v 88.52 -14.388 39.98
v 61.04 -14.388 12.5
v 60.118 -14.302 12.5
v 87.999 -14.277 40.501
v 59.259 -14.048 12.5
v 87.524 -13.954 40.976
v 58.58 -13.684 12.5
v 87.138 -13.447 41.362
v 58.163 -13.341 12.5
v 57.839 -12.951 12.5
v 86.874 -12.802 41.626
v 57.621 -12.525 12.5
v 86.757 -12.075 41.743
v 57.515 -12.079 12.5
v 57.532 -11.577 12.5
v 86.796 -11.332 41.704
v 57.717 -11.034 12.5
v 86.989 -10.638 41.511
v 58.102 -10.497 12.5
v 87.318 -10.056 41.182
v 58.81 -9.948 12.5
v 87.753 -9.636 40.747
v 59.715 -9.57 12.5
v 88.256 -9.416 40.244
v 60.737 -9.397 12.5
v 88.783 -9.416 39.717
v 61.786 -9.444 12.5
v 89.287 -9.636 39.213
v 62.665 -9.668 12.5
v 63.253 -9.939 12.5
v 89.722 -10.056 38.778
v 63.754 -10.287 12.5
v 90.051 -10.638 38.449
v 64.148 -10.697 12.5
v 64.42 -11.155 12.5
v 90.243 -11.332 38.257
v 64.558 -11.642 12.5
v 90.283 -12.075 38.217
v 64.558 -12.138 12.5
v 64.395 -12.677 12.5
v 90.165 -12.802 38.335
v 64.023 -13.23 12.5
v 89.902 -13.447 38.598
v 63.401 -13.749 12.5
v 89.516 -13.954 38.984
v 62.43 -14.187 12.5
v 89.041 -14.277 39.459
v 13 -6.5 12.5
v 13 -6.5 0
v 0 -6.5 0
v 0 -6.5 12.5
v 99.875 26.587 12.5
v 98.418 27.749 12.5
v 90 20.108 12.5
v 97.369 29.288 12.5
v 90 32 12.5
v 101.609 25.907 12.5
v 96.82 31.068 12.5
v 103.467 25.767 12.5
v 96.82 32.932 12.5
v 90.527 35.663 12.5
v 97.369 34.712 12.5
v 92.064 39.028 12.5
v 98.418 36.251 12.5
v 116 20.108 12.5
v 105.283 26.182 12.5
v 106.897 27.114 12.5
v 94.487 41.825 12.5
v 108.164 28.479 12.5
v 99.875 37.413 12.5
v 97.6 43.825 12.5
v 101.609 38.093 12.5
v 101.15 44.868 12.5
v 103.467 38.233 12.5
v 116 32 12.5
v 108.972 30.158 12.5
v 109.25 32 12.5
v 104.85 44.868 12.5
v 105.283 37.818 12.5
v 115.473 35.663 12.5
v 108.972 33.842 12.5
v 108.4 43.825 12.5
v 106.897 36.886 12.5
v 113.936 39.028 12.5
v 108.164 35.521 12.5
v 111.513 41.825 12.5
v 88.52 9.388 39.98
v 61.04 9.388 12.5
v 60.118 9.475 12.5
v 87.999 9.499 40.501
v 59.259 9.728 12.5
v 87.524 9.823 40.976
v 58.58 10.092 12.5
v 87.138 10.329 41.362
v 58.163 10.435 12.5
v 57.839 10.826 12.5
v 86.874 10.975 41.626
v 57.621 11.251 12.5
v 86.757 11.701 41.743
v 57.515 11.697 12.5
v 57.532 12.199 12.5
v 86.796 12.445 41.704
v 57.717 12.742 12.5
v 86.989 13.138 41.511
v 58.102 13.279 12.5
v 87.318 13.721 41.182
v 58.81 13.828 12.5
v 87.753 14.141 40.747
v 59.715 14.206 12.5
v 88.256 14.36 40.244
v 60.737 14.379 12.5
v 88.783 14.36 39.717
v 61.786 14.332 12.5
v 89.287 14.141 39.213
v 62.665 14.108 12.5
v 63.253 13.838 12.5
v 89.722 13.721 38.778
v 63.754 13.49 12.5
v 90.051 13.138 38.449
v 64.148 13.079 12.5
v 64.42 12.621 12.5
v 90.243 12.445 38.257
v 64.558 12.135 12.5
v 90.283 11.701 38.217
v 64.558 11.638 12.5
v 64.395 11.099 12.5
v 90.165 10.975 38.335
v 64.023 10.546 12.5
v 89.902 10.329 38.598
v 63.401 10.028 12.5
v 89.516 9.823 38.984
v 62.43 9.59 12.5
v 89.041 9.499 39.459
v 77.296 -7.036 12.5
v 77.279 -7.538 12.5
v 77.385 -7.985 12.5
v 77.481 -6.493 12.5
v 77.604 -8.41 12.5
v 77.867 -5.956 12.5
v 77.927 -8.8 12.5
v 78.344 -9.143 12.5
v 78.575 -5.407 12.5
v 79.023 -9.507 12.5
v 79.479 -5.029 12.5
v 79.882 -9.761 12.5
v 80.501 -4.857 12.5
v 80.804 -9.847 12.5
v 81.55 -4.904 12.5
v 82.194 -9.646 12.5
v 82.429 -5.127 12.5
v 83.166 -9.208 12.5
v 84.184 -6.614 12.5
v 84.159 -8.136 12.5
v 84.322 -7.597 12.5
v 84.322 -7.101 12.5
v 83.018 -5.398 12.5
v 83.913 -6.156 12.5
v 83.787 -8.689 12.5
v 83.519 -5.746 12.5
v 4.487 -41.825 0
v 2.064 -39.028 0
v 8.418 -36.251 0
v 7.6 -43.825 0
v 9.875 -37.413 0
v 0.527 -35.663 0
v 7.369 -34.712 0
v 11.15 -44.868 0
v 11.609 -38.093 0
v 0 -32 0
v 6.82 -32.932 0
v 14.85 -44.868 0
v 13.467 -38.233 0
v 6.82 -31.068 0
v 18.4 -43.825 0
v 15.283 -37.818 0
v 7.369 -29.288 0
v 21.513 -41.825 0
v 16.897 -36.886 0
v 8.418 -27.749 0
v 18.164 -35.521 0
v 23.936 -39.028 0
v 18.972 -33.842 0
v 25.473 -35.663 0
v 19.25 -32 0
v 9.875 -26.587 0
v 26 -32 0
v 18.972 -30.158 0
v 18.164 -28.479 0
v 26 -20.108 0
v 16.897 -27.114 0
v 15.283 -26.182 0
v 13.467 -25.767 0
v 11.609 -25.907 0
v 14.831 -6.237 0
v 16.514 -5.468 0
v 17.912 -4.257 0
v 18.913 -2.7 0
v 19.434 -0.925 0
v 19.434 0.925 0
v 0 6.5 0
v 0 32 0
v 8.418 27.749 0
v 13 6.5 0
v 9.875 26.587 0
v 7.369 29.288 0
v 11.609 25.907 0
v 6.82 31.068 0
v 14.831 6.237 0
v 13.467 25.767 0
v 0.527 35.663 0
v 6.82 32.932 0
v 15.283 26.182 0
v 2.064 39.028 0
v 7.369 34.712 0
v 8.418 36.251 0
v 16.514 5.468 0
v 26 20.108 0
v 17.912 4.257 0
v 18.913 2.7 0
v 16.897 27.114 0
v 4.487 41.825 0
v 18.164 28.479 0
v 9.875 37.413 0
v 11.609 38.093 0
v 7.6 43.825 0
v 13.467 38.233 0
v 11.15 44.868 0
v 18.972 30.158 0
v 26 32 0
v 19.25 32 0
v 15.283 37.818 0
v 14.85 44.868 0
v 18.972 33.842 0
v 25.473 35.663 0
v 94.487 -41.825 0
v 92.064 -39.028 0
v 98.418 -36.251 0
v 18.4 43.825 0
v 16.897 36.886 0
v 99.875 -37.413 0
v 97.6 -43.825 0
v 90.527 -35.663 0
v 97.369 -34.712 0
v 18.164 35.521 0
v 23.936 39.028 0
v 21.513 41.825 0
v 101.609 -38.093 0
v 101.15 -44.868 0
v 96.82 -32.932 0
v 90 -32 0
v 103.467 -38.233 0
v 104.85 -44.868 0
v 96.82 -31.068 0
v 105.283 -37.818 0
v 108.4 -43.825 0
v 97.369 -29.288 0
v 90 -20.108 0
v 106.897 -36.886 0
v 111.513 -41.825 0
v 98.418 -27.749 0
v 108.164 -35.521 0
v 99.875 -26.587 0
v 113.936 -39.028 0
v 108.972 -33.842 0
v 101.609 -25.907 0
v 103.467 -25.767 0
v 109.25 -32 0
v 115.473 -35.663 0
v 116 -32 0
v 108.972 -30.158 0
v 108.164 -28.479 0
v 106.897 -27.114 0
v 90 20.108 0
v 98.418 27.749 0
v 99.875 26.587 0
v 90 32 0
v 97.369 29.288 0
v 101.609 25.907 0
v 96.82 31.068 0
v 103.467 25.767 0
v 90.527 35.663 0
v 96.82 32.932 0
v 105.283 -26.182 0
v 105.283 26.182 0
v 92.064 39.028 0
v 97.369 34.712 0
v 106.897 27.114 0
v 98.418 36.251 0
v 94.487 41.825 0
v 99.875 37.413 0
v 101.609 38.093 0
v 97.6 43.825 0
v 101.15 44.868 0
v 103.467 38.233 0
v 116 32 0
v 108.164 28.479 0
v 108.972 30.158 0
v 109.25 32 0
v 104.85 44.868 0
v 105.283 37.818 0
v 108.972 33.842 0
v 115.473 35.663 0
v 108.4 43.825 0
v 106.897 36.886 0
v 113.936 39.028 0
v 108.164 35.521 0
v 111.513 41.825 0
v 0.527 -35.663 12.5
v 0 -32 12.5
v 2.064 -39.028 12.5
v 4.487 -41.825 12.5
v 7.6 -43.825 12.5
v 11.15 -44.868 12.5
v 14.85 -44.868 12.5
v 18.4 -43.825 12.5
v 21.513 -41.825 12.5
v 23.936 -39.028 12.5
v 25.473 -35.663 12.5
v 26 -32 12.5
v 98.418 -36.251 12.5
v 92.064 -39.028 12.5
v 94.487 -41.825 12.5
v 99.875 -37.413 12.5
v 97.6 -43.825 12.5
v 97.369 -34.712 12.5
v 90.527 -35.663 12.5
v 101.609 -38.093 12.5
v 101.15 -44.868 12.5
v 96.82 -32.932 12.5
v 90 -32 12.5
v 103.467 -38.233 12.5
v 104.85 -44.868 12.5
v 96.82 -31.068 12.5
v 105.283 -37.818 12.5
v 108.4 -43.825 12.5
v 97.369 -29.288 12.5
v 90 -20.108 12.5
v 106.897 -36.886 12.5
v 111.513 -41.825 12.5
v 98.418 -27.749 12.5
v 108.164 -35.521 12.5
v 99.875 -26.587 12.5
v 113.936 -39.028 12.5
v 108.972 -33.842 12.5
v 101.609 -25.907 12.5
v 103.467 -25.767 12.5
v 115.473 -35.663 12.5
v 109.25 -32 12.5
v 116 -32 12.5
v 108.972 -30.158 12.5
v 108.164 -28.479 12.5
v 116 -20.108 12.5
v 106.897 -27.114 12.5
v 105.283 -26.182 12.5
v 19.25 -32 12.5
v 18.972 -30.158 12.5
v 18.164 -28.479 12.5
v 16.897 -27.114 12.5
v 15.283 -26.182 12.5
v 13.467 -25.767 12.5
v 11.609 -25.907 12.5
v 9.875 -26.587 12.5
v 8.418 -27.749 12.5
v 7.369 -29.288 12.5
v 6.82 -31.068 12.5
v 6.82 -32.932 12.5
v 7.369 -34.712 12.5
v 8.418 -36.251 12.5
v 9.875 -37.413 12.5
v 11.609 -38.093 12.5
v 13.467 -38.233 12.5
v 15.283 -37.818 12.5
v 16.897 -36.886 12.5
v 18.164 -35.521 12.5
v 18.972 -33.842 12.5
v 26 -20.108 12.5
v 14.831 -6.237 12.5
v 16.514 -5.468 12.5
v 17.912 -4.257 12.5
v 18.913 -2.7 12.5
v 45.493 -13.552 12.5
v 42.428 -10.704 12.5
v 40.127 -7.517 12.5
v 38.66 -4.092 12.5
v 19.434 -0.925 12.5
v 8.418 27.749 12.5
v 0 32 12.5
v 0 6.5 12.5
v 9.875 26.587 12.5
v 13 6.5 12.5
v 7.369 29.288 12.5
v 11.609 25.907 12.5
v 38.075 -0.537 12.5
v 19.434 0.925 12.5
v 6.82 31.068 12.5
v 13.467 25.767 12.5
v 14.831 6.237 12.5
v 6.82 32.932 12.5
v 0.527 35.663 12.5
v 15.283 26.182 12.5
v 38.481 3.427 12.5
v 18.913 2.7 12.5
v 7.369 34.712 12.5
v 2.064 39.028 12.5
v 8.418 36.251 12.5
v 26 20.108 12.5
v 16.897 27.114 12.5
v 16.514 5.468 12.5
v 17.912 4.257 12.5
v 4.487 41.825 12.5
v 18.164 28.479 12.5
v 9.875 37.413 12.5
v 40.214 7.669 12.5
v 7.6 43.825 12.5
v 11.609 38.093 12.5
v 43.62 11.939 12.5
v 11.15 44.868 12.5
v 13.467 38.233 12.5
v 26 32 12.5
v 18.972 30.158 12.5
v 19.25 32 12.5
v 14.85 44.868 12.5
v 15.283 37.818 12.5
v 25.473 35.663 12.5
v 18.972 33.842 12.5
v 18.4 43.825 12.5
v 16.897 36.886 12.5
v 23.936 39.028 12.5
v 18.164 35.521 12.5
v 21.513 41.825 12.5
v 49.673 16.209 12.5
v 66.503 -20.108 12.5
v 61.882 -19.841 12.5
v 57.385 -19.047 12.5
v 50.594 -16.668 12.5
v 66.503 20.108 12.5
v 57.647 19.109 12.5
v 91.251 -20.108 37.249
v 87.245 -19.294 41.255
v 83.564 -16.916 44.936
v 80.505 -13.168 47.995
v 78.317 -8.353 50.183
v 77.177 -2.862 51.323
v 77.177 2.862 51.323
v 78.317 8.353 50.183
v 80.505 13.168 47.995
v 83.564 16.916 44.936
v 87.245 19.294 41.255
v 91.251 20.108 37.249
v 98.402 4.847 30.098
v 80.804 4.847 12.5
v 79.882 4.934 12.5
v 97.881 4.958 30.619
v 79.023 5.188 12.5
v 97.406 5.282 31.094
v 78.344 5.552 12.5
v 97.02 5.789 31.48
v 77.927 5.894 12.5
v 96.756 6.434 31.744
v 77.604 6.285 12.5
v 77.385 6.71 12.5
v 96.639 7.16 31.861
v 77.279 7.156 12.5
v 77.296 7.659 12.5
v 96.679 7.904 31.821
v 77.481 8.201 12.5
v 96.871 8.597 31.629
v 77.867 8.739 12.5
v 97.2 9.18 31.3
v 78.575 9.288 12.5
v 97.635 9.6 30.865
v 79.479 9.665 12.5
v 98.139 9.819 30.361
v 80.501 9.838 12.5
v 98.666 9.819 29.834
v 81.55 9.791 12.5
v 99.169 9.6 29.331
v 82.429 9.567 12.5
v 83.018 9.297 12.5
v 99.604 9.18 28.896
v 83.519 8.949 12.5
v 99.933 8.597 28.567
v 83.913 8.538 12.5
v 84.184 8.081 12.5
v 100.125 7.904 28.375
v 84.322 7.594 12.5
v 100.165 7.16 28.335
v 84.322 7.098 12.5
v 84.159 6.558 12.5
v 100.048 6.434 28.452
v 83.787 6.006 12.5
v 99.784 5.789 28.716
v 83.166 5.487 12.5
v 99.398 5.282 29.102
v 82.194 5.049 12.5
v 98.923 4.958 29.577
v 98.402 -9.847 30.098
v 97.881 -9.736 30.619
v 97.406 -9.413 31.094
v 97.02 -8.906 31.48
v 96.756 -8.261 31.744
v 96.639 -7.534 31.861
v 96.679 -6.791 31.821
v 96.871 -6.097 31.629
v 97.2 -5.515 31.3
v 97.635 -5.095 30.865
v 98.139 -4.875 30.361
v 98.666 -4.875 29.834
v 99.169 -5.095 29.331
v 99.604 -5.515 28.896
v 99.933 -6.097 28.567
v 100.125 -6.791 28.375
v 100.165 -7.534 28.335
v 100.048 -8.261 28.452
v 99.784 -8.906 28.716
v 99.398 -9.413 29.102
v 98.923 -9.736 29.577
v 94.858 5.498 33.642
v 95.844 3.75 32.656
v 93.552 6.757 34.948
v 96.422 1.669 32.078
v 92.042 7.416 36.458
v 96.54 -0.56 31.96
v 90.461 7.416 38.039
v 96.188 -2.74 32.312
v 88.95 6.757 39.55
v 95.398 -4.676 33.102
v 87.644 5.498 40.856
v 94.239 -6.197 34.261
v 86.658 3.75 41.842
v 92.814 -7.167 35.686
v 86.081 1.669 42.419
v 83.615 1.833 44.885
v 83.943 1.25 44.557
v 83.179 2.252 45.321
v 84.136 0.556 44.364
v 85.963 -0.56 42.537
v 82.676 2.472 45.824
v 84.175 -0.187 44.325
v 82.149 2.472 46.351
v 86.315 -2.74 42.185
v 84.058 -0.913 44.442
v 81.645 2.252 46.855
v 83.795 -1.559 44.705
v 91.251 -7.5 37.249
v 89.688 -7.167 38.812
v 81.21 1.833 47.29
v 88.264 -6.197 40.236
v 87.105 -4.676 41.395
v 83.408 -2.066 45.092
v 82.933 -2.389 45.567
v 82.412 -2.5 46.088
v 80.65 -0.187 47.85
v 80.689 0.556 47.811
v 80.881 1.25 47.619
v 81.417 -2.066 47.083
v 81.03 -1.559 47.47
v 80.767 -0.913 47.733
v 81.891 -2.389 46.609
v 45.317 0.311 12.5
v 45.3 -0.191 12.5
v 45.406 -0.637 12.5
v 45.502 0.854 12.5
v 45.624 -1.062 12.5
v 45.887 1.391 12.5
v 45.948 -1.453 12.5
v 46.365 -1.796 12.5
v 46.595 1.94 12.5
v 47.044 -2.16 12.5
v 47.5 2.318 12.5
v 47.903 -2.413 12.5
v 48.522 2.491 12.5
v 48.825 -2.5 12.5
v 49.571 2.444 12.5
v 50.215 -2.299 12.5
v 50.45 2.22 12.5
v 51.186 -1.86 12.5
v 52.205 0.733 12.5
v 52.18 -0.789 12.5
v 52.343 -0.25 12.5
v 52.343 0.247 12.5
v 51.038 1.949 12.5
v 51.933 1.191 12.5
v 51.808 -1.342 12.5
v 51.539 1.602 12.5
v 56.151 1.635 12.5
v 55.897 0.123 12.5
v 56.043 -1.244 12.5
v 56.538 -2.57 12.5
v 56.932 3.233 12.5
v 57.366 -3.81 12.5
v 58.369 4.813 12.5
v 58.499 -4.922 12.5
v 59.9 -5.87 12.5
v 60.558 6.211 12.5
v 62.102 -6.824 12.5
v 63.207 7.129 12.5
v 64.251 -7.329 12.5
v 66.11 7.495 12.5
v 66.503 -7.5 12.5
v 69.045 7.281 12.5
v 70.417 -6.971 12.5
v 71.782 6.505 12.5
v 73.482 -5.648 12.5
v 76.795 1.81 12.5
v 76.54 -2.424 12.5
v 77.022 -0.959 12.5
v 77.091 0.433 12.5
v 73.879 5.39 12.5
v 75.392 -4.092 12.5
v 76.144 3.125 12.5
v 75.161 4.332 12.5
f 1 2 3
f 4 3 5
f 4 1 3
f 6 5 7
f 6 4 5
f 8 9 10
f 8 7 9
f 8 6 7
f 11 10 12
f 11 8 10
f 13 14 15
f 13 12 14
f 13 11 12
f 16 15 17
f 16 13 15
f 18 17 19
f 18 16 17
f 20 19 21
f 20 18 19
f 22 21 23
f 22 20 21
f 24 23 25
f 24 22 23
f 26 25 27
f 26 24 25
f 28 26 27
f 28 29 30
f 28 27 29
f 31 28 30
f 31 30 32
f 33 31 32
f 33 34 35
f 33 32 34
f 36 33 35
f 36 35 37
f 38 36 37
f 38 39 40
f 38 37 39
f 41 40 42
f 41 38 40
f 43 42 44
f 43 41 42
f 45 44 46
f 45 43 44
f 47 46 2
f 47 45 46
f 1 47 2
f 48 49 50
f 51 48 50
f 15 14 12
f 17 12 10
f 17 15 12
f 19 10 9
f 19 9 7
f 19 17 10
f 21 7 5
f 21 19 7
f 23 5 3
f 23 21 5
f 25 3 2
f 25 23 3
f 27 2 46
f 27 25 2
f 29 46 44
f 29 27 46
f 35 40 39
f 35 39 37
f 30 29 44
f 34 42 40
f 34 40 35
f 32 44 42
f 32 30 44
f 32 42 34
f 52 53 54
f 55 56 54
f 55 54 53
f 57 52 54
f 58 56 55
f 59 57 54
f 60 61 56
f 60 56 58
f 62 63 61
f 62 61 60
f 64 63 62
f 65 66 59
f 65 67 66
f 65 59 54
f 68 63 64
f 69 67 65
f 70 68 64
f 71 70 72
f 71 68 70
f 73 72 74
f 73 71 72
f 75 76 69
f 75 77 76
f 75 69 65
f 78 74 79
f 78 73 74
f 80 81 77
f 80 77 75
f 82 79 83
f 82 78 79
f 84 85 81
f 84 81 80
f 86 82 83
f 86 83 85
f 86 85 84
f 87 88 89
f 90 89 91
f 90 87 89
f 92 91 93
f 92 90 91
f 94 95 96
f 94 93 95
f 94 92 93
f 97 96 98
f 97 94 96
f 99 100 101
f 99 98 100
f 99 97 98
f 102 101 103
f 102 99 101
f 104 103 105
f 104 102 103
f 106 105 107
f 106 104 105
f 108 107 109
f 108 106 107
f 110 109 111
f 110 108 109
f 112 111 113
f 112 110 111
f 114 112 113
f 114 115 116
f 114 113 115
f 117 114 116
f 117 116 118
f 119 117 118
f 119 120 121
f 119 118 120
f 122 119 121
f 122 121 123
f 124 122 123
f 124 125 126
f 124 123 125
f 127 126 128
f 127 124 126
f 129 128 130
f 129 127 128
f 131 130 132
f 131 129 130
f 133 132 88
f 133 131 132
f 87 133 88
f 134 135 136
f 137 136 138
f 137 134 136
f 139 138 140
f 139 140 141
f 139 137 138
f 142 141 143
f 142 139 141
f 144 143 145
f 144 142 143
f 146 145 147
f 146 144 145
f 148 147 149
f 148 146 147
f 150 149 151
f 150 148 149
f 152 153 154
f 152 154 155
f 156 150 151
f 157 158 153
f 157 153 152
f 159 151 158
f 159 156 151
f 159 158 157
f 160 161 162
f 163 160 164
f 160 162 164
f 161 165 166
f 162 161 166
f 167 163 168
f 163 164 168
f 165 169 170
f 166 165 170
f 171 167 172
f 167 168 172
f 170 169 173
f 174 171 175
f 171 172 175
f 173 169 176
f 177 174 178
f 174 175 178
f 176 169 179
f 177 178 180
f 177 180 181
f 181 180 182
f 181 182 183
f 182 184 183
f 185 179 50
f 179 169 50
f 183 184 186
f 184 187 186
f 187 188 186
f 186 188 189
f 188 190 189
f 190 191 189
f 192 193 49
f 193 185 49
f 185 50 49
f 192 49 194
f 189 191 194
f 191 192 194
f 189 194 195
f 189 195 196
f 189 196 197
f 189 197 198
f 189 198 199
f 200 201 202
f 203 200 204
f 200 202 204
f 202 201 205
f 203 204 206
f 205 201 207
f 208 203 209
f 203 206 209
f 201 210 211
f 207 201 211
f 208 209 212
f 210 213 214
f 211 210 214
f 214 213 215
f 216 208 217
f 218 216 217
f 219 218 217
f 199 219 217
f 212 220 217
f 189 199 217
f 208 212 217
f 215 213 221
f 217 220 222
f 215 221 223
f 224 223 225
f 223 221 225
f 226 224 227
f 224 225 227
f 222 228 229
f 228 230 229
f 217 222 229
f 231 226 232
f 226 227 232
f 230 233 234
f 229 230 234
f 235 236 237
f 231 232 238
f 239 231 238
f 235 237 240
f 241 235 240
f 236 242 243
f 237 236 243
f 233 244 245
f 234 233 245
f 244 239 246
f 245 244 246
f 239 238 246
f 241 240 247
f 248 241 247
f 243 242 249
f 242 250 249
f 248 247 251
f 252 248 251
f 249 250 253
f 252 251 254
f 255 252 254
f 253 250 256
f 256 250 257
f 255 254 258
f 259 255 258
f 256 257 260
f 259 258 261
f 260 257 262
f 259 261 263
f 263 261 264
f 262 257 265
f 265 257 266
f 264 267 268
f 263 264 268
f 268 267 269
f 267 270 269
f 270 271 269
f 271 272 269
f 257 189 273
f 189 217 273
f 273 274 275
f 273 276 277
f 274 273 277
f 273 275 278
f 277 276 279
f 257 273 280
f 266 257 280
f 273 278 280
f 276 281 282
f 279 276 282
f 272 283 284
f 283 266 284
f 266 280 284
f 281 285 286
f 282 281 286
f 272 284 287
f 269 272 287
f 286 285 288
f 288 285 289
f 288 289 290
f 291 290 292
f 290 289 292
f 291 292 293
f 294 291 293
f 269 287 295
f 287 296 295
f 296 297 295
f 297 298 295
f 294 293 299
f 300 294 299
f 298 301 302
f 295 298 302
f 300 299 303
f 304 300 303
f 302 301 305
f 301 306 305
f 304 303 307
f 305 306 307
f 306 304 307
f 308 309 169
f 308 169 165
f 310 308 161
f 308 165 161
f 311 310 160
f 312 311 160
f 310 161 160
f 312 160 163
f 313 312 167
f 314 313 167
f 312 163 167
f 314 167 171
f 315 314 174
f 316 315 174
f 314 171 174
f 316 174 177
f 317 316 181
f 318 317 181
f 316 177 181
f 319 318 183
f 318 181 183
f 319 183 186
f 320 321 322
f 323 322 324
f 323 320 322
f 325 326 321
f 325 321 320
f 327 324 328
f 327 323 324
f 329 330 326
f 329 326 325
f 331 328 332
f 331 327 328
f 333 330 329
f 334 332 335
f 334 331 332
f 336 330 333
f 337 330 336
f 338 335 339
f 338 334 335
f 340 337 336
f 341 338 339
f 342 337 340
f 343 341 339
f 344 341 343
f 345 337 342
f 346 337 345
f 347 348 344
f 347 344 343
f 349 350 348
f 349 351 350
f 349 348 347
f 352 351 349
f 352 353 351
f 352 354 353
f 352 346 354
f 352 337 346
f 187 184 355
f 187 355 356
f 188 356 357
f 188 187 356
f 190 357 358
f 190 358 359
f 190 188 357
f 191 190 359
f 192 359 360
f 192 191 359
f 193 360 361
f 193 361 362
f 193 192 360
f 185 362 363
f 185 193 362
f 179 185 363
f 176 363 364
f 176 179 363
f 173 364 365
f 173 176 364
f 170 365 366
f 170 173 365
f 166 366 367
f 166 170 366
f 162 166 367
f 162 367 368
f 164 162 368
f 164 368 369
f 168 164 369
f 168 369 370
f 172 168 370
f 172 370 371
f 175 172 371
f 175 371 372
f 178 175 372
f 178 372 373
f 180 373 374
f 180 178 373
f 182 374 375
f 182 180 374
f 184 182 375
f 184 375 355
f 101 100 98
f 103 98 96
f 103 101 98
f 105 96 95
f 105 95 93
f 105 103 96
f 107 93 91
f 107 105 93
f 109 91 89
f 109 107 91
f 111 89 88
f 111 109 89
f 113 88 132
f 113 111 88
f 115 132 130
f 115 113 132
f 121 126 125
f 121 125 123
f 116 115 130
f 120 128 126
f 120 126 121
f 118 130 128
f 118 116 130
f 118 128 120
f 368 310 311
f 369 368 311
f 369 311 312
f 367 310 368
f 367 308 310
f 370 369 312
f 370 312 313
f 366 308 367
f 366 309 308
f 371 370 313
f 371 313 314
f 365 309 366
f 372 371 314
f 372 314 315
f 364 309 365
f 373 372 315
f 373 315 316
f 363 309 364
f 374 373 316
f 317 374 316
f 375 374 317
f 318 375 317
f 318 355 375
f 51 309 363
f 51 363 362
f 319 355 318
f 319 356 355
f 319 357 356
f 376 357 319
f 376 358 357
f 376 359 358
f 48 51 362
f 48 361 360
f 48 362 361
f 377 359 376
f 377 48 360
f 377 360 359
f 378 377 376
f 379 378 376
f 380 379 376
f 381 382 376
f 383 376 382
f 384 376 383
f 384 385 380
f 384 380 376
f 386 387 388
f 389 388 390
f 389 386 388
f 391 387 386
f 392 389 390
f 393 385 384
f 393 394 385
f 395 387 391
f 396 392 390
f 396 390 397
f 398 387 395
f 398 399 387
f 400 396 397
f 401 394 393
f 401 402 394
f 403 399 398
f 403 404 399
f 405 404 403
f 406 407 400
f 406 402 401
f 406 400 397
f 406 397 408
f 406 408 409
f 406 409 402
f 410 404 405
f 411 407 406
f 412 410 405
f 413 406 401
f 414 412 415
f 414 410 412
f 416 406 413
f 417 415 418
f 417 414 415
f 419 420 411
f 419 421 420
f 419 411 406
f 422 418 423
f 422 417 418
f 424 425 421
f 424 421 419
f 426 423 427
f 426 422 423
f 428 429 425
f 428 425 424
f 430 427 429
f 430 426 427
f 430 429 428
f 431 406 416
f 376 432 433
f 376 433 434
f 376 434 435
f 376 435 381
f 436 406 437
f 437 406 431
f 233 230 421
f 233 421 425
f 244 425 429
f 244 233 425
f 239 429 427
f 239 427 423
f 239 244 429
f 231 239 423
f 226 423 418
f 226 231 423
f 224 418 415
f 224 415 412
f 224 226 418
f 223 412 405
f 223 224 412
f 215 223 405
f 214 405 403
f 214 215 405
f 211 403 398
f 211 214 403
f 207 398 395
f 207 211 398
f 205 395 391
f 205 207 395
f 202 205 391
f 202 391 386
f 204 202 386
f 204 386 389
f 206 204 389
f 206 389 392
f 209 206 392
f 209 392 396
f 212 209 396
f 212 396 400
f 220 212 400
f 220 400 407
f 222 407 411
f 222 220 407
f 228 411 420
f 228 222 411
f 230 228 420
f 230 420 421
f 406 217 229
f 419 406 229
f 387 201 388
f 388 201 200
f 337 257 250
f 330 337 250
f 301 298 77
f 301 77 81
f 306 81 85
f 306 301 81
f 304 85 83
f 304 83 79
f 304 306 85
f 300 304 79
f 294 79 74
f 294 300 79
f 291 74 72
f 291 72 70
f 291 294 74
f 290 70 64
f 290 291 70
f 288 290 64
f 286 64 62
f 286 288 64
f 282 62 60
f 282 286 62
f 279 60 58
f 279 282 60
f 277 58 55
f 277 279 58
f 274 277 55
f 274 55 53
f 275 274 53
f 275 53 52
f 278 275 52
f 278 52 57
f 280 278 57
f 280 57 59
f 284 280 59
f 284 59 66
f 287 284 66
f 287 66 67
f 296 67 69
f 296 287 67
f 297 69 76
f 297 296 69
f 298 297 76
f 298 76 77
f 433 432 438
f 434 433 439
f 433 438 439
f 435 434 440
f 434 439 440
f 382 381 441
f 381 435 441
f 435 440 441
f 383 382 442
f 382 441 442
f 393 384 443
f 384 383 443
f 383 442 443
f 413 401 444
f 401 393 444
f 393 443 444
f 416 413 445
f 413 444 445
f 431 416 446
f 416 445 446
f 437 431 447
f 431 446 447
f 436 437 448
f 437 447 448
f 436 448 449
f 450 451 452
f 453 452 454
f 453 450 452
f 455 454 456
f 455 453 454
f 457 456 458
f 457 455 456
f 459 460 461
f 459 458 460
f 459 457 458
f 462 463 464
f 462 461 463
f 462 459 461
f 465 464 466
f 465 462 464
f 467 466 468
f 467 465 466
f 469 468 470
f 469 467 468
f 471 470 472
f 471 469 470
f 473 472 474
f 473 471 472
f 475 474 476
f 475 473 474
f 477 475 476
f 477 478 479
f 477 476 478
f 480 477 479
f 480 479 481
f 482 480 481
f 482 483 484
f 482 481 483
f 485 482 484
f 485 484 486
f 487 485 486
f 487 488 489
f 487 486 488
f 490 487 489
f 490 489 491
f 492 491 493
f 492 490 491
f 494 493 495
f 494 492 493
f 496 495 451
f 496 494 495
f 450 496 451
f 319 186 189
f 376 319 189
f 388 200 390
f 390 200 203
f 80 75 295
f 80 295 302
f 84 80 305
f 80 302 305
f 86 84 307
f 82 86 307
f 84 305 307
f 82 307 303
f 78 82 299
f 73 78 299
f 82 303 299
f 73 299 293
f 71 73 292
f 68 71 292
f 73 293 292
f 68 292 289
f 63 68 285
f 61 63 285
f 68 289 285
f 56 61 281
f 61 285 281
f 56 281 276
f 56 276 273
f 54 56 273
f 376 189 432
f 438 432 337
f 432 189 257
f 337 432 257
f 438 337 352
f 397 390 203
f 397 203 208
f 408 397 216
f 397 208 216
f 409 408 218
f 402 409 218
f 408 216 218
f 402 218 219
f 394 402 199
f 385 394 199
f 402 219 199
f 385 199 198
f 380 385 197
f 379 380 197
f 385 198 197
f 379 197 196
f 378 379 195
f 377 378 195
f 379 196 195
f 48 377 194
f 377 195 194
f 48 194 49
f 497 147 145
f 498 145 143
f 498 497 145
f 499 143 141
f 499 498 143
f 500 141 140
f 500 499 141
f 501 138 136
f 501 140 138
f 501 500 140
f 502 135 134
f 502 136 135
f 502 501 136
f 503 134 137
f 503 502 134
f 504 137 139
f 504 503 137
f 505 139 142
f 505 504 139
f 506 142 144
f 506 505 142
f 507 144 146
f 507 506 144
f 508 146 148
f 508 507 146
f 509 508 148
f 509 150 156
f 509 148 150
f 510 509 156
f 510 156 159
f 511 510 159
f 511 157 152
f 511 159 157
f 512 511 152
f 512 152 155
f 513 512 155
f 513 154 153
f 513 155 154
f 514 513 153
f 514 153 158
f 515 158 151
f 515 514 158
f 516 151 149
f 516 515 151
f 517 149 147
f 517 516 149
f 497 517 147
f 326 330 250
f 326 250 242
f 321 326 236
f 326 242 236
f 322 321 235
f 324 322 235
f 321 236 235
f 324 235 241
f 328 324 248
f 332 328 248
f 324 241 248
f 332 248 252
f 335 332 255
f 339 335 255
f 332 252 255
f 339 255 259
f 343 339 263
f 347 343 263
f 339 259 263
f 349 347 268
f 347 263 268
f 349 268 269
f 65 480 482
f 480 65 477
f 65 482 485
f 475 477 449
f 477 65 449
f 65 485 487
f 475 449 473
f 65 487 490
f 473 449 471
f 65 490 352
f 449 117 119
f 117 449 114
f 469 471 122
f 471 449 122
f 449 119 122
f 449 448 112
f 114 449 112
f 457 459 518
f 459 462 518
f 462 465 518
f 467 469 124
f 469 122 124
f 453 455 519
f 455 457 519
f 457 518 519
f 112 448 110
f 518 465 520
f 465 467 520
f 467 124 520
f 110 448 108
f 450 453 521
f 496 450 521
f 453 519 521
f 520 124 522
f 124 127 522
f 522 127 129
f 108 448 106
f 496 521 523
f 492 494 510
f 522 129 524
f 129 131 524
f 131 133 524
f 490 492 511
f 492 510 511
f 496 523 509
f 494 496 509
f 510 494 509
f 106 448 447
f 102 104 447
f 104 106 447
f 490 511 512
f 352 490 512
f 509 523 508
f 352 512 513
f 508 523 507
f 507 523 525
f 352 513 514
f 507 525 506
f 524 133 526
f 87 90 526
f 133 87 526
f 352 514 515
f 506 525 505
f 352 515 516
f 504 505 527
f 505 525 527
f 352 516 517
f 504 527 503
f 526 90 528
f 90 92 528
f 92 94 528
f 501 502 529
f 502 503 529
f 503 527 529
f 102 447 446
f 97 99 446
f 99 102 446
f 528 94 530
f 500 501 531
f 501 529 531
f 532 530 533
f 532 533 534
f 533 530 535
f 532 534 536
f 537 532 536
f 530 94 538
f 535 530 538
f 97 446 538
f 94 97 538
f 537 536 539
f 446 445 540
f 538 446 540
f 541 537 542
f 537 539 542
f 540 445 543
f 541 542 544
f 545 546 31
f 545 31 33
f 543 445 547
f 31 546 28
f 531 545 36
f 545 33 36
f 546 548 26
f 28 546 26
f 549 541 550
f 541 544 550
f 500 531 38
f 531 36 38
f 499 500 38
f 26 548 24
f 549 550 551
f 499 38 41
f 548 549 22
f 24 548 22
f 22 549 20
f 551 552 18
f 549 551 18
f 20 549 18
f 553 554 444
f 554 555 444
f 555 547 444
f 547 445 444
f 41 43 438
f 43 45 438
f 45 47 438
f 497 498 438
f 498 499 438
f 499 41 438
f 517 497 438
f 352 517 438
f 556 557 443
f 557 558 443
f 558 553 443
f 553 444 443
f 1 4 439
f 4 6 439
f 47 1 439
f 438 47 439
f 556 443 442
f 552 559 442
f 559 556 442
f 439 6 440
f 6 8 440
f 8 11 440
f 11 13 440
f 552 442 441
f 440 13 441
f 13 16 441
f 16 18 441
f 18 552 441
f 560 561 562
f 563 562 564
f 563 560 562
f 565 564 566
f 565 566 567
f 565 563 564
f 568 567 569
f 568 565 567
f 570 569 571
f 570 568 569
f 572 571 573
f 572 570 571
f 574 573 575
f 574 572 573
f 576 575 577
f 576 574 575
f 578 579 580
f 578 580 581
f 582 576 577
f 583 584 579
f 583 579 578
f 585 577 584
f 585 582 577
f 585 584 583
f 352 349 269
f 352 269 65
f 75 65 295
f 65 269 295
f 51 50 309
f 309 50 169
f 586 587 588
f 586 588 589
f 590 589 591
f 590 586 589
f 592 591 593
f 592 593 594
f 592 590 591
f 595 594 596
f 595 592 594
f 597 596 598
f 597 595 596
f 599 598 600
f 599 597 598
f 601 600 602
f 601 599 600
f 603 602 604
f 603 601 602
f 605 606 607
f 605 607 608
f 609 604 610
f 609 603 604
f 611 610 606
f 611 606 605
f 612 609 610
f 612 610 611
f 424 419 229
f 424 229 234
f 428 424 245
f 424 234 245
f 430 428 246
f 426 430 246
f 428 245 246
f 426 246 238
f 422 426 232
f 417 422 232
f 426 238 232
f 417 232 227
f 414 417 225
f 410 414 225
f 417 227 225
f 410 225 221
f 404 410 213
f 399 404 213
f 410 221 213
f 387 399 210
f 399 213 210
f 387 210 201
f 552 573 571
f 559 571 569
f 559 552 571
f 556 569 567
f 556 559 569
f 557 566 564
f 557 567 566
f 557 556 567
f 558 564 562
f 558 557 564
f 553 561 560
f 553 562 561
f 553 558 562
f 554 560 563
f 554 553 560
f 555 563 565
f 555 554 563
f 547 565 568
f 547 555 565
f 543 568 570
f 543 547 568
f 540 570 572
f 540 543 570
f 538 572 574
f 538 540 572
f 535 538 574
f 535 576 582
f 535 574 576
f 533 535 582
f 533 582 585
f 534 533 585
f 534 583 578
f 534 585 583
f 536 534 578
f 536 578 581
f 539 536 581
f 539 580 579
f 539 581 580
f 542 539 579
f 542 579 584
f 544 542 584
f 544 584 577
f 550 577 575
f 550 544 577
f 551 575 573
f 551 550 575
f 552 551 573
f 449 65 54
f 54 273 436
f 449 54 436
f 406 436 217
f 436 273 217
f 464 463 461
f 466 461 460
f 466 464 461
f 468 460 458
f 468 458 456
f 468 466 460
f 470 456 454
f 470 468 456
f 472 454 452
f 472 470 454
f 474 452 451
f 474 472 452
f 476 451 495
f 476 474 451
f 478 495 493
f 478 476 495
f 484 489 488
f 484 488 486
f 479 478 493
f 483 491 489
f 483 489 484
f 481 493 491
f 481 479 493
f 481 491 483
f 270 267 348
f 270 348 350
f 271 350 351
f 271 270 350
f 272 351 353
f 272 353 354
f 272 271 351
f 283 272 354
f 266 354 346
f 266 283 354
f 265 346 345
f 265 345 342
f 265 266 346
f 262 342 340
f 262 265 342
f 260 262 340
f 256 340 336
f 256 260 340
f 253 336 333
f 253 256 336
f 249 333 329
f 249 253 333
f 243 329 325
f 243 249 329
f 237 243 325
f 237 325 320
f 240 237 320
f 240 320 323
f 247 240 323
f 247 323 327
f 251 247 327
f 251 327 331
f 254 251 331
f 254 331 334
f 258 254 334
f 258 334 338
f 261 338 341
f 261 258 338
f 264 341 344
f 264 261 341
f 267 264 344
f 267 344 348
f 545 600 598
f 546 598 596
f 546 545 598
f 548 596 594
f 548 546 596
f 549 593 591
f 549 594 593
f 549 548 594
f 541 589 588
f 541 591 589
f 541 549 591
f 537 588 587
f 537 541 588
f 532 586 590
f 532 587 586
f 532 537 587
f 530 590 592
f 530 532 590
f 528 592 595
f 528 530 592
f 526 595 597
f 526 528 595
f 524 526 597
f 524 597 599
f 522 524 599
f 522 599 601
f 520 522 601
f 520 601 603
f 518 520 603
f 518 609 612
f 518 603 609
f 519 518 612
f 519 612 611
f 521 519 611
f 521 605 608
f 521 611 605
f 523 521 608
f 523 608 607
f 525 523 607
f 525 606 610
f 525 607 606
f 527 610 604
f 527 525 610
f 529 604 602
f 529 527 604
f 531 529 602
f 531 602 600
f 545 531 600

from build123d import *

# Parameters (mm, degrees)
F0_R     = 6.25
F1_DEPTH = 12.5
F3_R     = 2.5
F3_R_2   = 7.5
F4_REACH = 159.0869091096


with BuildPart() as f1:
    # F0 (on Top) → F1 (new body)
    with BuildSketch(Plane.XY):
        with BuildLine():
            Line((0, 32), (0, 6.5))
            Line((0, 6.5), (13, 6.5))
            ThreePointArc((13, 6.5), (19.5, 0), (13, -6.5))
            Line((13, -6.5), (0, -6.5))
            Line((0, -6.5), (0, -32))
            ThreePointArc((0, -32), (13, -45), (26, -32))
            Line((26, -32), (26, -20.1084308683))
            Line((26, -20.1084308683), (90, -20.1084308683))
            Line((90, -20.1084308683), (90, -32))
            ThreePointArc((90, -32), (103, -45), (116, -32))
            Line((116, -32), (116, 32))
            ThreePointArc((116, 32), (103, 45), (90, 32))
            Line((90, 32), (90, 20.1084308683))
            Line((90, 20.1084308683), (26, 20.1084308683))
            Line((26, 20.1084308683), (26, 32))
            ThreePointArc((26, 32), (13, 45), (0, 32))
        make_face()
        with Locations((13, -32)):
            Circle(F0_R, mode=Mode.SUBTRACT)
        with Locations((103, -32)):
            Circle(F0_R, mode=Mode.SUBTRACT)
        with Locations((13, 32)):
            Circle(F0_R, mode=Mode.SUBTRACT)
        with Locations((103, 32)):
            Circle(F0_R, mode=Mode.SUBTRACT)
    extrude(amount=F1_DEPTH)

    f4_end = f1.faces().sort_by_distance((59.8447932422, 0, 0))[0]
    # F3 (on face) → F4 (join, up to a face of the model that its end follows)
    with BuildSketch(Plane(origin=(64.25, 0, 64.25), x_dir=(0, -1, 0), z_dir=(-0.7071067812, 0, -0.7071067812))):
        with BuildLine():
            Line((-20.1084308683, -73.1855518528), (20.1084308683, -73.1855518528))
            Line((20.1084308683, -73.1855518528), (20.1084308683, -38.1855518528))
            ThreePointArc((20.1084308683, -38.1855518528), (0, -18.0771209845), (-20.1084308683, -38.1855518528))
            Line((-20.1084308683, -38.1855518528), (-20.1084308683, -73.1855518528))
        make_face()
        with Locations((-7.3473156537, -48.2982642825)):
            Circle(F3_R, mode=Mode.SUBTRACT)
        with Locations((7.3473156537, -48.2982642825)):
            Circle(F3_R, mode=Mode.SUBTRACT)
        with Locations((-11.8882064537, -34.3228394231)):
            Circle(F3_R, mode=Mode.SUBTRACT)
        with Locations((0, -38.1855518528)):
            Circle(F3_R_2, mode=Mode.SUBTRACT)
        with Locations((11.8882064537, -34.3228394231)):
            Circle(F3_R, mode=Mode.SUBTRACT)
        with Locations((0, -25.6855518528)):
            Circle(F3_R, mode=Mode.SUBTRACT)
    f4_long = extrude(amount=F4_REACH, mode=Mode.PRIVATE)
    add(split(f4_long, bisect_by=f4_end, keep=Keep.BOTTOM, mode=Mode.PRIVATE))


solid = f1.part
